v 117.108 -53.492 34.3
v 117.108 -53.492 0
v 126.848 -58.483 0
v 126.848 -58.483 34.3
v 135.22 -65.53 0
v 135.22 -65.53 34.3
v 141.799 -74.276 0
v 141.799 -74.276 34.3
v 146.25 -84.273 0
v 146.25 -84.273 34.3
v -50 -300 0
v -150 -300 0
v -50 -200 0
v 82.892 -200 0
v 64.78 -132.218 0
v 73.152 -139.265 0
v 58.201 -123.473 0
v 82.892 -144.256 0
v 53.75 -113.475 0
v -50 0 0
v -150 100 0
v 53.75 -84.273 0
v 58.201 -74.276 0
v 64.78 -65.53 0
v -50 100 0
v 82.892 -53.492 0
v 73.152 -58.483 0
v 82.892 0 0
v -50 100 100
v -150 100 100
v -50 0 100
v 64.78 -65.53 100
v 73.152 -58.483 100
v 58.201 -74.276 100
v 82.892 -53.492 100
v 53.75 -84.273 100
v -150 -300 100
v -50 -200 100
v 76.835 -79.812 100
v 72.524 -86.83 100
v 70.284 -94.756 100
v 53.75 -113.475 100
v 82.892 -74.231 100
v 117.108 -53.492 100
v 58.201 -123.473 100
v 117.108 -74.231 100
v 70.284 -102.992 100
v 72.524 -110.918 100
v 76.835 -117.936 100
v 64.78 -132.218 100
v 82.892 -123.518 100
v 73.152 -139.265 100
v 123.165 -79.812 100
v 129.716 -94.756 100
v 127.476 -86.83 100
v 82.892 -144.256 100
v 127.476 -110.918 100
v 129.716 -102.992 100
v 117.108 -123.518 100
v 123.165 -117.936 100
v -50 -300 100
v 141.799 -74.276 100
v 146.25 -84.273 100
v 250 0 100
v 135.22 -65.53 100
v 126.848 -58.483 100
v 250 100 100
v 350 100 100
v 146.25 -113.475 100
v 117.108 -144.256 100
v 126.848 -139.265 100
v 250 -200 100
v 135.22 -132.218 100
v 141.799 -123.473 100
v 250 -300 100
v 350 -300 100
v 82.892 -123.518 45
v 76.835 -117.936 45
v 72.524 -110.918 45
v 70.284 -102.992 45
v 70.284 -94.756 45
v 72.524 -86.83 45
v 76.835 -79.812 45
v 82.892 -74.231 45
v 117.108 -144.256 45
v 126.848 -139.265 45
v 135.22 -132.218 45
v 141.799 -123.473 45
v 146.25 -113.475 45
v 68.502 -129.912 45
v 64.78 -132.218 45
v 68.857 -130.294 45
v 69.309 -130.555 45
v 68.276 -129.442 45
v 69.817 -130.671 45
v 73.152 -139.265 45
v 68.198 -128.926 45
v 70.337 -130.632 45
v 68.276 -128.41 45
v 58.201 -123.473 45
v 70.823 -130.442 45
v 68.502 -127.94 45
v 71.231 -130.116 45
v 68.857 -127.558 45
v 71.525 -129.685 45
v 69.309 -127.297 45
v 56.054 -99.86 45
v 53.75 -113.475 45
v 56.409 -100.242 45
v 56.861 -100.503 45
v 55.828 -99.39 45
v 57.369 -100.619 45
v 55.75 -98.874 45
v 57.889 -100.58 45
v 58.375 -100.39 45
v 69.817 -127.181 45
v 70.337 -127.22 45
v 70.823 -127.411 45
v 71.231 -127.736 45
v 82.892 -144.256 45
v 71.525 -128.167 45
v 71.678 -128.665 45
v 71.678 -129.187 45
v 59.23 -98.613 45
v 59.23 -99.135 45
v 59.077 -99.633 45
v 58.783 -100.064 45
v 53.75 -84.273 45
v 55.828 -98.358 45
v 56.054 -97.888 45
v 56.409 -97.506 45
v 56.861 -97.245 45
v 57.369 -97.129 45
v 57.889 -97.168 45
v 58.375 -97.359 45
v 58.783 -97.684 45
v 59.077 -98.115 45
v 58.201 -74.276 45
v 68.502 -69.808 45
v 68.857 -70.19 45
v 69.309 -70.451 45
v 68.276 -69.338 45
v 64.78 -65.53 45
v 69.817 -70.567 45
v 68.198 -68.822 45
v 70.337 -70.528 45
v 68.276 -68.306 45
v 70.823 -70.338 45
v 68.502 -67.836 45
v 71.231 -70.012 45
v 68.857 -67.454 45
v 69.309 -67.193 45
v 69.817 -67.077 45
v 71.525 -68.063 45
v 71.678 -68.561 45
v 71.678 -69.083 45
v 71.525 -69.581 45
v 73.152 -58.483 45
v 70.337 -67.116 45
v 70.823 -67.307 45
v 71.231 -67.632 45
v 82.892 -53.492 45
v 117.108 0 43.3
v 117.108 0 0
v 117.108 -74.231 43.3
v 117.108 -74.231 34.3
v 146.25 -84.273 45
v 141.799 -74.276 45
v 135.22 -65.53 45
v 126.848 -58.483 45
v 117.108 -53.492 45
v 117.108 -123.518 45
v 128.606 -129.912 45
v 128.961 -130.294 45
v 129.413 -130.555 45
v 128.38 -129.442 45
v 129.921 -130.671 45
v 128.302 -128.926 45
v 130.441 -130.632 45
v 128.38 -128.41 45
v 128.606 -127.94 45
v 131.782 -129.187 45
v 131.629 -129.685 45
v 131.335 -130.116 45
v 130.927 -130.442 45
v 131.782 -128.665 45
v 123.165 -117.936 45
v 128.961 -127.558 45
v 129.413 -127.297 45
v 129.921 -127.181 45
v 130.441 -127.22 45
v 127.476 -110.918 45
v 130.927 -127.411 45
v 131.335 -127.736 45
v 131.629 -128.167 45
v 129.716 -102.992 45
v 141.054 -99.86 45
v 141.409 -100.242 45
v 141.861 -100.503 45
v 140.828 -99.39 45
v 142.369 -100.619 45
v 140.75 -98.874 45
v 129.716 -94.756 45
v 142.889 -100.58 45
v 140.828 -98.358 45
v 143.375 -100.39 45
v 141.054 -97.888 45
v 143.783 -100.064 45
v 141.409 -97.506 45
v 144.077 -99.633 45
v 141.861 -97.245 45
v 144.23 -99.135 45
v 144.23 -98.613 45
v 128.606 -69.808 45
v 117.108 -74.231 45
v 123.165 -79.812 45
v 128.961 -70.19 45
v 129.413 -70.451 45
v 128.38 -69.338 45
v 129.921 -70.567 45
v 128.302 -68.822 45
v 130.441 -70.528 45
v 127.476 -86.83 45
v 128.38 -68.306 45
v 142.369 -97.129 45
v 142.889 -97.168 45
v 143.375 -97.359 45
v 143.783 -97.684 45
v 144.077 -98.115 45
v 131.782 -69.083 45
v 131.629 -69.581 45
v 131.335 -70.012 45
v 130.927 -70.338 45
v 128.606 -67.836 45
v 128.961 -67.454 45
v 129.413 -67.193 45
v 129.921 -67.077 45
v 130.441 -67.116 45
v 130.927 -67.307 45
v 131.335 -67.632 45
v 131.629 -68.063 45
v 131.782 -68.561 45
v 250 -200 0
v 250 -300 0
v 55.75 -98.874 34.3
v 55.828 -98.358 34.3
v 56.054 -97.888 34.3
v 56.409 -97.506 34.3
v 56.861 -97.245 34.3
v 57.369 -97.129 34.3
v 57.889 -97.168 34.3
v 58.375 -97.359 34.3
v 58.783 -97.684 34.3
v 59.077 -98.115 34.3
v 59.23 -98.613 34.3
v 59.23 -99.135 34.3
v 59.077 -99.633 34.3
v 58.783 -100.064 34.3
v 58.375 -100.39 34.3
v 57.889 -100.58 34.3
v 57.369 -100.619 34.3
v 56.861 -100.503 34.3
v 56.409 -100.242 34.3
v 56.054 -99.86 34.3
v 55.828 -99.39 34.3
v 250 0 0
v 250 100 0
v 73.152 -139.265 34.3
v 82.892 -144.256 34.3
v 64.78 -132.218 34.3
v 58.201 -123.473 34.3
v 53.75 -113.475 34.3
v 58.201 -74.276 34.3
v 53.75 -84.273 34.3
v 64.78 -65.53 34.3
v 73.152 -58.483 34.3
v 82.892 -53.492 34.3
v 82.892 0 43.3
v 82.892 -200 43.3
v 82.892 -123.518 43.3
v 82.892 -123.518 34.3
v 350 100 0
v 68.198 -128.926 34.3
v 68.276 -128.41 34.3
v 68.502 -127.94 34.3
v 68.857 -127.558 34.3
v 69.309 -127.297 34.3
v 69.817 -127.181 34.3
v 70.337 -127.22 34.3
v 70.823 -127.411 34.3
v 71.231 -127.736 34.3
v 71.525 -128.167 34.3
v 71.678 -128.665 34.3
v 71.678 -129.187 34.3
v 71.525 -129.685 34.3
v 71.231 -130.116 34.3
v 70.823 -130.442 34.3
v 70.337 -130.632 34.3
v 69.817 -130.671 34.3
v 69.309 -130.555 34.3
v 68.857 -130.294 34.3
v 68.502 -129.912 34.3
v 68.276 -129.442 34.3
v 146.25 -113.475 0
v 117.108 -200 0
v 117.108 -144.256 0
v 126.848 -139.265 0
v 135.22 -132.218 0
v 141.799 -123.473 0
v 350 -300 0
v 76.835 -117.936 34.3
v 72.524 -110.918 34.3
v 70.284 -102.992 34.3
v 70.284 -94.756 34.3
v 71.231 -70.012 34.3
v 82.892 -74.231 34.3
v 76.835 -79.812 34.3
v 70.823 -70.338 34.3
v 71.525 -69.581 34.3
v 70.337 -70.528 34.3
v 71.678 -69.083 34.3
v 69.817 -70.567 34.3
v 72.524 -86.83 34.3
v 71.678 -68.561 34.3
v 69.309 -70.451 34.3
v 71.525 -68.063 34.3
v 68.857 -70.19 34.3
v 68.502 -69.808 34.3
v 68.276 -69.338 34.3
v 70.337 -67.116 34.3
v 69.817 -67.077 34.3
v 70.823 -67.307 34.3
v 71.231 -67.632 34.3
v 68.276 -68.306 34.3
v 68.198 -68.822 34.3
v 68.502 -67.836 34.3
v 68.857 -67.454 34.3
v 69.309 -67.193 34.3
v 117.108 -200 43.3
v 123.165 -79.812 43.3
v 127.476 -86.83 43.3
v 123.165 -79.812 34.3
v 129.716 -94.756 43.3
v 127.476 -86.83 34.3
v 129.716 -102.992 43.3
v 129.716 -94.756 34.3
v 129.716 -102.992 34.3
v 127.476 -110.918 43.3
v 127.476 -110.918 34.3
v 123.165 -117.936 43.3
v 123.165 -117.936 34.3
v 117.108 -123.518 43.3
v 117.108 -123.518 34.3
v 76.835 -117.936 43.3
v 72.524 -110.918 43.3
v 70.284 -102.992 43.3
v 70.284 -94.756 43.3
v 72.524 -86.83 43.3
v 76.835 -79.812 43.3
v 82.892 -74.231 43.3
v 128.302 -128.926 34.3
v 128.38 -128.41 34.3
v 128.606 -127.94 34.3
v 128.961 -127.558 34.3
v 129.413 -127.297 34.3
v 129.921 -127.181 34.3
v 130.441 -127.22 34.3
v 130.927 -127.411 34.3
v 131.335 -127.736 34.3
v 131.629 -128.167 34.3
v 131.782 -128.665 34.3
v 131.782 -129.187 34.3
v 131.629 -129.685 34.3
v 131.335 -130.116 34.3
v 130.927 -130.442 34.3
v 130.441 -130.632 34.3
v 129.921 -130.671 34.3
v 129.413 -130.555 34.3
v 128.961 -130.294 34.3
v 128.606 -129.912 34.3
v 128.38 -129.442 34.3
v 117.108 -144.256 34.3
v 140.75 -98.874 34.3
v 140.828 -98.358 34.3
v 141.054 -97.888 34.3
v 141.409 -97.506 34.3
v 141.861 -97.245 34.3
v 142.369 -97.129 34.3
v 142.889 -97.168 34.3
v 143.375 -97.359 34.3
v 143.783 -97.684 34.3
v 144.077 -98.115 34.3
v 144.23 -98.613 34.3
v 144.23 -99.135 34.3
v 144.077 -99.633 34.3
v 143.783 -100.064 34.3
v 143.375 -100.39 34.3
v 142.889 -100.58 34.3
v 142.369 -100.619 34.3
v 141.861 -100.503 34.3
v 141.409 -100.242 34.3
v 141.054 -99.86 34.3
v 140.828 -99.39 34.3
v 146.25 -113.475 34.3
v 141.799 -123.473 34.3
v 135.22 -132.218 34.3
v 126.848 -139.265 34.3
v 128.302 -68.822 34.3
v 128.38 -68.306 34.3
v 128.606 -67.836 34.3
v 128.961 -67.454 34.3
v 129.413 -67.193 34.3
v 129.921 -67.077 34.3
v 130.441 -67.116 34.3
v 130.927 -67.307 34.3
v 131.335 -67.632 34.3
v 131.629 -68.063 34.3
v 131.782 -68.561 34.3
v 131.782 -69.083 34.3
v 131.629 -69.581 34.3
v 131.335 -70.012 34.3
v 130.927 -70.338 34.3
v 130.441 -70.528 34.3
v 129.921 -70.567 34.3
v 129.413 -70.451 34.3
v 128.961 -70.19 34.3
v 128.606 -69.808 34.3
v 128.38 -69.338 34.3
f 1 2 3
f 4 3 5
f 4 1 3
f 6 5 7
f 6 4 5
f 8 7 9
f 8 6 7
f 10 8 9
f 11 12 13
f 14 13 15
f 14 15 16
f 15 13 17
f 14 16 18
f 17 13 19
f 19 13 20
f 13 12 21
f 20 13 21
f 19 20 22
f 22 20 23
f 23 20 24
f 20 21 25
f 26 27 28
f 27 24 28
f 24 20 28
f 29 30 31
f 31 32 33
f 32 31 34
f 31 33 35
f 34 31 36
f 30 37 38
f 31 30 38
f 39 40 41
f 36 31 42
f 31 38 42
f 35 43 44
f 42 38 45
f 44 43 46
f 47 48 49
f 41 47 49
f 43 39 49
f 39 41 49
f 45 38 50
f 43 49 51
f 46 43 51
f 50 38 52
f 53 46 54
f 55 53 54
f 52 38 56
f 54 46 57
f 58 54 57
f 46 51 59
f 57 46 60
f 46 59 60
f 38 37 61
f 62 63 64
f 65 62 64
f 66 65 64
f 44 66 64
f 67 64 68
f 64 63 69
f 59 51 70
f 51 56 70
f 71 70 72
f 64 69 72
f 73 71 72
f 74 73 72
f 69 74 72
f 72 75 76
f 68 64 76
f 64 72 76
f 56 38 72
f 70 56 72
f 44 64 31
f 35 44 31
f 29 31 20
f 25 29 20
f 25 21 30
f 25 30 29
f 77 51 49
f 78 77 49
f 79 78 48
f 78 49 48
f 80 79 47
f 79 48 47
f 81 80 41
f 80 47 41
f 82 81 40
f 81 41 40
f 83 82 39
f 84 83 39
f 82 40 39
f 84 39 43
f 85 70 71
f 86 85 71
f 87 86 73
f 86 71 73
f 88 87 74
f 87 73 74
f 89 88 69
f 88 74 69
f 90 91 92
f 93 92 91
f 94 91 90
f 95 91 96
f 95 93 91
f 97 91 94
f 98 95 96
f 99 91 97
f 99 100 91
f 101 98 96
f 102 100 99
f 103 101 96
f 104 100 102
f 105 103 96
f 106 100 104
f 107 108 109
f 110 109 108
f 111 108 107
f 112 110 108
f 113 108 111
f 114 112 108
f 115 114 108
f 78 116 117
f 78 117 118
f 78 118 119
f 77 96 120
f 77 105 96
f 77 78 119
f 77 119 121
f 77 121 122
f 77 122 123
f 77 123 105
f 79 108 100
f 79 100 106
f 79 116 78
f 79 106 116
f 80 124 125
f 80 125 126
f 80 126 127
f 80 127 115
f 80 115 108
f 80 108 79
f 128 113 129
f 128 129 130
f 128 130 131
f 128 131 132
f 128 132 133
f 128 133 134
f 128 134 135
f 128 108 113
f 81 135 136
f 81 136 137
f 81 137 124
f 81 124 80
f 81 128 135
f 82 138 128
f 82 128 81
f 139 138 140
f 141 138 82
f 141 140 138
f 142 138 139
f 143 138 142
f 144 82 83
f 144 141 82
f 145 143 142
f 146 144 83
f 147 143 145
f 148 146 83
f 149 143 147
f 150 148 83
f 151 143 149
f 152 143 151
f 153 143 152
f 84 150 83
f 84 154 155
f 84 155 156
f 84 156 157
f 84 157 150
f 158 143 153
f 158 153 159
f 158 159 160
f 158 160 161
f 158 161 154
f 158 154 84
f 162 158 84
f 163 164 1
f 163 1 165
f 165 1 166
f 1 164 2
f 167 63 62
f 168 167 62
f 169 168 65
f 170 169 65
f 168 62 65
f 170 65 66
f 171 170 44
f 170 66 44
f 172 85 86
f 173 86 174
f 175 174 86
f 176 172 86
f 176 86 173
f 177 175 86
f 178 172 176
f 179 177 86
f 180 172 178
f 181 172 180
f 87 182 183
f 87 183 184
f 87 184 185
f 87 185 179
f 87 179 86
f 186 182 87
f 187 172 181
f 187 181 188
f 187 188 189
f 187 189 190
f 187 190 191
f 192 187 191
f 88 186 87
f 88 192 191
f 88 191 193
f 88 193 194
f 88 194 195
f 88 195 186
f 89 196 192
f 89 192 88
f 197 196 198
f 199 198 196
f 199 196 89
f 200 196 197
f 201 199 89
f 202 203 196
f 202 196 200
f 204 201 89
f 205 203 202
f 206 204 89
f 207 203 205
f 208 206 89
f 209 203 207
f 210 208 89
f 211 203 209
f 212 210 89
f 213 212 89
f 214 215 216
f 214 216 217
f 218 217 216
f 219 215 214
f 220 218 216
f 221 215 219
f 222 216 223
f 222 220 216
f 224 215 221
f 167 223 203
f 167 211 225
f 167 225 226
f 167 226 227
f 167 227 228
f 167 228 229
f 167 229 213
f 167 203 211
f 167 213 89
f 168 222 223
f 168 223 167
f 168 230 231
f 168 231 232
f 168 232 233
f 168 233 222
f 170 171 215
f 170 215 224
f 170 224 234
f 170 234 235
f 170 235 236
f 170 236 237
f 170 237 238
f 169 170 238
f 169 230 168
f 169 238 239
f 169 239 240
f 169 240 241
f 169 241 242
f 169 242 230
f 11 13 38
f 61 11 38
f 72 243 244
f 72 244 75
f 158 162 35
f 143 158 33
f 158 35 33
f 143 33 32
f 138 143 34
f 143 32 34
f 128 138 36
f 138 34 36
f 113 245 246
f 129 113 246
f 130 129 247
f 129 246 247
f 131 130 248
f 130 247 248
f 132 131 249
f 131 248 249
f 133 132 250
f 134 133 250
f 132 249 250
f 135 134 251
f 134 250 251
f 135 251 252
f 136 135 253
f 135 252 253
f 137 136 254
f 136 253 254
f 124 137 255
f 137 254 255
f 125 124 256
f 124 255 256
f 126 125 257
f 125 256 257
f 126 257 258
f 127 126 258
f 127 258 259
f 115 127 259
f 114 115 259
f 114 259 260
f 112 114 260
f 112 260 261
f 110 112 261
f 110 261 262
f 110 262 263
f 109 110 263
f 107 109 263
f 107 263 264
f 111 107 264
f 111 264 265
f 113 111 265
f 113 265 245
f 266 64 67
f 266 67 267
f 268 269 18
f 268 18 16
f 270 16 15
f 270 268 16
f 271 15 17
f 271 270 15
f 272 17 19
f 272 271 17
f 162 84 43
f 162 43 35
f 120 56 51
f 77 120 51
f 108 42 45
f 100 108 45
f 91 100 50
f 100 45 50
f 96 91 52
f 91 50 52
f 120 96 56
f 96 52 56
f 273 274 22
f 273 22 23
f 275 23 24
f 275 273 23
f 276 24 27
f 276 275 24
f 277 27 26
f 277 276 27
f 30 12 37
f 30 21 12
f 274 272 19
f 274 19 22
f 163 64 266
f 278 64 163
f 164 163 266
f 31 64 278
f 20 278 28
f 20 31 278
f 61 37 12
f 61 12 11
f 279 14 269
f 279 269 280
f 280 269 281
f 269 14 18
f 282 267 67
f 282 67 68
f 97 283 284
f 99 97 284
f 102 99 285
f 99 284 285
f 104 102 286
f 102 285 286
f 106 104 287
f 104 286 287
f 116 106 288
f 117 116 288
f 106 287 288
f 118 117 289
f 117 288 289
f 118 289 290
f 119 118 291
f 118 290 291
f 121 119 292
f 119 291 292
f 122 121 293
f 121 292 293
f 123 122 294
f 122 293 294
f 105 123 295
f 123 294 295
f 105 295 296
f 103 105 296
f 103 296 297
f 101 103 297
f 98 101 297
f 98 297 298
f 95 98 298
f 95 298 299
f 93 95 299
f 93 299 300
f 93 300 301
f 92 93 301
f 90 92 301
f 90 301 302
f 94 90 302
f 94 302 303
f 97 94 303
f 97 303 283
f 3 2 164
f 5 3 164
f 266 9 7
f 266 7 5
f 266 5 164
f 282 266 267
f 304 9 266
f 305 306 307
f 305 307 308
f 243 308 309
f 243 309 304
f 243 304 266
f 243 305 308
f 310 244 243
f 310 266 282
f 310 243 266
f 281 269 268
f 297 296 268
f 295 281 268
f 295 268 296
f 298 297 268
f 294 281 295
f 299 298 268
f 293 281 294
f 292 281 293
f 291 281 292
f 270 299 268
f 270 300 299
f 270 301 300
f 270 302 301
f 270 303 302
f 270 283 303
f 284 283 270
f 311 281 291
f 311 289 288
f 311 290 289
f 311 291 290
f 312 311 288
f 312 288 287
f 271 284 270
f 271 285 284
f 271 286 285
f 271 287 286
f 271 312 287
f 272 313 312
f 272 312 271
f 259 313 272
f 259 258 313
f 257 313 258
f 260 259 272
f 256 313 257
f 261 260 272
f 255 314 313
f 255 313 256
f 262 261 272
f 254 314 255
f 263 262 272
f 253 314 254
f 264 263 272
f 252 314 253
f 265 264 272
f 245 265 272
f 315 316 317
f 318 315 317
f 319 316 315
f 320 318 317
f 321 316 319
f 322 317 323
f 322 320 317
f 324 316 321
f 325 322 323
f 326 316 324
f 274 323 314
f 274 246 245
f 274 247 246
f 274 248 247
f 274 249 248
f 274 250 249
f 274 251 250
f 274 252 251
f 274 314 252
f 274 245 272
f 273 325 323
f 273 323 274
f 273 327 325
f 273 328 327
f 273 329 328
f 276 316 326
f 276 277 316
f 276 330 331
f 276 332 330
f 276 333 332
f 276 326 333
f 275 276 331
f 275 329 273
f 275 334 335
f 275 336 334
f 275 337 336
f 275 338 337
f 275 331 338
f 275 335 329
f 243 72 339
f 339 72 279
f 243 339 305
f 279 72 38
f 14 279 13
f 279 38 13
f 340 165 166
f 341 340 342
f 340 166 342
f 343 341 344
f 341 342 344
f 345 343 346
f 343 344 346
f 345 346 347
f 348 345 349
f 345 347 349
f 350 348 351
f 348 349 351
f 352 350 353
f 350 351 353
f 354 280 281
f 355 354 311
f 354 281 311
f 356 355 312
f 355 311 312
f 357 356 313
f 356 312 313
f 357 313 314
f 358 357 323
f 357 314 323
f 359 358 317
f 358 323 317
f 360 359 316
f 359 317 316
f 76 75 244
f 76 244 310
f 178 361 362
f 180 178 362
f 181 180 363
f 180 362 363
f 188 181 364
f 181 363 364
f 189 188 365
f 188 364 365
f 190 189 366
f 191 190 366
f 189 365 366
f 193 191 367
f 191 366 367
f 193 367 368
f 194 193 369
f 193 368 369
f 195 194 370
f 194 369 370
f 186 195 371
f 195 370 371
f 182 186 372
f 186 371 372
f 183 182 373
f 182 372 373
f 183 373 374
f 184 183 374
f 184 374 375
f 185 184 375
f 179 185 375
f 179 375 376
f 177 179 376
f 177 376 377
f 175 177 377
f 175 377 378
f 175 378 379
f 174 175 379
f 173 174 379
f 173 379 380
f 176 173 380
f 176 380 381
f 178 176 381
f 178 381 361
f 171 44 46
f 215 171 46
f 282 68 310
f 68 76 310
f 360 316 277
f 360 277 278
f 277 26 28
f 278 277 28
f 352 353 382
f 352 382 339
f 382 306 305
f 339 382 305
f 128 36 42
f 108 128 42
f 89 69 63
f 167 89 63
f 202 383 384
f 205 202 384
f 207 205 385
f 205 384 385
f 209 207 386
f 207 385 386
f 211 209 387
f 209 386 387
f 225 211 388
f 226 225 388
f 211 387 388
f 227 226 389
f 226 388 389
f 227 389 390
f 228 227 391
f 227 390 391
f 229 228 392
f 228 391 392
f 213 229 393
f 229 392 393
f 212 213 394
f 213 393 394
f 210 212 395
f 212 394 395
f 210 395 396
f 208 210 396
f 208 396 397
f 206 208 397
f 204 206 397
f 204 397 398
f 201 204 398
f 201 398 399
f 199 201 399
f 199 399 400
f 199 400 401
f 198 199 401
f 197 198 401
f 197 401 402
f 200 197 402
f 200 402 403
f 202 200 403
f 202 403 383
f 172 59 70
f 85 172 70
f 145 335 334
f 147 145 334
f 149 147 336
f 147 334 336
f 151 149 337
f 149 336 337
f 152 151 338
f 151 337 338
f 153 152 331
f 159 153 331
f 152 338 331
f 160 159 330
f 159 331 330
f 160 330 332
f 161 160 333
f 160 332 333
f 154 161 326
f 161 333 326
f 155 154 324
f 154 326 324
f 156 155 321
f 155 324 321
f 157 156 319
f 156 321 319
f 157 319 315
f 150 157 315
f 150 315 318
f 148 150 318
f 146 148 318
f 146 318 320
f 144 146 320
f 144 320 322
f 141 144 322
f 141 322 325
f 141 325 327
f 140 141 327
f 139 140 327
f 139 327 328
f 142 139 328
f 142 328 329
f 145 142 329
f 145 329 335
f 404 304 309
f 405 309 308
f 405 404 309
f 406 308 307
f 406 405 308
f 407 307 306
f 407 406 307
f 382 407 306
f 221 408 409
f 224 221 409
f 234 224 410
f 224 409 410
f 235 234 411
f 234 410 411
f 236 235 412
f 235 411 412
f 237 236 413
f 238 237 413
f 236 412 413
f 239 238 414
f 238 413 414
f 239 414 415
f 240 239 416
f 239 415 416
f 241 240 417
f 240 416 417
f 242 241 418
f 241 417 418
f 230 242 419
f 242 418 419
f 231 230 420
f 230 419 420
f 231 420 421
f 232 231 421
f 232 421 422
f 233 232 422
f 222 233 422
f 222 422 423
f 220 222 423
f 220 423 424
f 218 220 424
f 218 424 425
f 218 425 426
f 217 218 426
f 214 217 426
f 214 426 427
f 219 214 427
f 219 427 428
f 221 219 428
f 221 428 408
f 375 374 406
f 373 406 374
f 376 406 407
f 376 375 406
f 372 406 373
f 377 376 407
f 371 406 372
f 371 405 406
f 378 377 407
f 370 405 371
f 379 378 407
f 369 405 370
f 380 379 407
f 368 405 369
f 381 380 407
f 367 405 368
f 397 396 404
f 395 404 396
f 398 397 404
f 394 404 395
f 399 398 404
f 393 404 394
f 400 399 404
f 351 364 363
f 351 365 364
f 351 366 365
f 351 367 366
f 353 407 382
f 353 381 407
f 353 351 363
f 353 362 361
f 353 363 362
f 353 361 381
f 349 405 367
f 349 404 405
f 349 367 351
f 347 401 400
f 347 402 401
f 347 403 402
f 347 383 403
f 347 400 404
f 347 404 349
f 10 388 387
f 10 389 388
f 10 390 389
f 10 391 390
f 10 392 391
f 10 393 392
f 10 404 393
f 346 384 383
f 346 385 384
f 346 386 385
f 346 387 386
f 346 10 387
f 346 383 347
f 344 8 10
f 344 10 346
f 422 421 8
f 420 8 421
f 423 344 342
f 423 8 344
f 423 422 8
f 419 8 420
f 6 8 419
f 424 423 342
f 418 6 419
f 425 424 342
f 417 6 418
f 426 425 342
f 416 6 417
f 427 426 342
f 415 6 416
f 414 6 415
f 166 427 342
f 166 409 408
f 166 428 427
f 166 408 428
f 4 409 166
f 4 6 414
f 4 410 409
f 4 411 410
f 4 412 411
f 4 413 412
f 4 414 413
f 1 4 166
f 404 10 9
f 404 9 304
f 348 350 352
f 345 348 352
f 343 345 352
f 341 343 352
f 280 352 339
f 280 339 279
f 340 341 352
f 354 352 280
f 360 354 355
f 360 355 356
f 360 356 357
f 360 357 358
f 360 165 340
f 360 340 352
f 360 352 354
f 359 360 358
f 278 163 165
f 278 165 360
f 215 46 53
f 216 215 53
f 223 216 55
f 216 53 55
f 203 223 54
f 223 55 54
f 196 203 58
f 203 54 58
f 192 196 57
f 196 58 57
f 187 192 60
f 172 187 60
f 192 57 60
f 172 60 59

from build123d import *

# Parameters (mm, degrees)
SKETCH_1_W               = 200
SKETCH_1_H               = 200
EXTRUDE_1_DEPTH          = 100
CUT_EXTRUDE_1_DEPTH      = 301
CUT_EXTRUDE_1_DEPTH_BACK = 34.3
SKETCH_3_R               = 30
CUT_EXTRUDE_2_DEPTH      = 9
CUT_EXTRUDE_3_REACH      = 302
CUT_EXTRUDE_4_DEPTH      = 55
SKETCH_7_R               = 1.75
CUT_EXTRUDE_7_DEPTH      = 291.373018719
SKETCH_9_W               = 100
SKETCH_9_H               = 200
EXTRUDE_2_DEPTH          = 150
SKETCH_10_W              = 100
SKETCH_10_H              = 200
EXTRUDE_3_DEPTH          = 150
SKETCH_11_W              = 100
SKETCH_11_H              = 100
EXTRUDE_4_DEPTH          = 100
SKETCH_12_W              = 100
SKETCH_12_H              = 100
EXTRUDE_5_DEPTH          = 100


with BuildPart() as part:
    # 草图1 → 凸台-拉伸1 (new body)
    with BuildSketch(Plane.XY):
        with Locations((100, -100)):
            Rectangle(SKETCH_1_W, SKETCH_1_H)
    extrude(amount=EXTRUDE_1_DEPTH)

    # 草图2 → 切除-拉伸1 (cut, two sides: drawn at the far end of the back side and taken through both)
    with BuildSketch(Plane(origin=(0, 0, 0), x_dir=(-1, 0, 0), z_dir=(0, 0, -1)).offset(-CUT_EXTRUDE_1_DEPTH_BACK)):
        with BuildLine():
            Line((-146.25, -84.273215621), (-146.25, -98.874157372))
            Line((-146.25, -98.874157372), (-146.25, -113.475099122))
            ThreePointArc((-146.25, -113.475099122), (-100, -147.374157372), (-53.75, -113.475099122))
            Line((-53.75, -113.475099122), (-53.75, -84.273215621))
            ThreePointArc((-53.75, -84.273215621), (-100, -50.374157372), (-146.25, -84.273215621))
        make_face()
    extrude(amount=CUT_EXTRUDE_1_DEPTH + CUT_EXTRUDE_1_DEPTH_BACK, mode=Mode.SUBTRACT)

    # 草图3 → 切除-拉伸2 (cut)
    with BuildSketch(Plane(origin=(0, 0, 34.3), x_dir=(-1, 0, 0), z_dir=(0, 0, -1))):
        with Locations((-100, -98.874157372)):
            Circle(SKETCH_3_R)
    extrude(amount=-CUT_EXTRUDE_2_DEPTH, mode=Mode.SUBTRACT)

    # 切除-拉伸3: up to this face of the body (flat: up to its plane)
    cut_extrude_3_end = Plane(part.part.faces().sort_by_distance((100, -98.874157372, 43.3))[0])
    # 草图4 → 切除-拉伸3 (cut, up to the picked face)
    with BuildSketch(Plane(origin=(0, 0, 0), x_dir=(-1, 0, 0), z_dir=(0, 0, -1)), mode=Mode.PRIVATE) as cut_extrude_3_sk1:
        with BuildLine():
            Line((-82.891665128, 0), (-117.108334872, 0))
            Line((-117.108334872, 0), (-117.108334872, -53.491838371))
            ThreePointArc((-117.108334872, -53.491838371), (-100, -50.374157372), (-82.891665128, -53.491838371))
            Line((-82.891665128, -53.491838371), (-82.891665128, 0))
        make_face()
    cut_extrude_3_tool1 = split(extrude(cut_extrude_3_sk1.sketch, amount=-CUT_EXTRUDE_3_REACH, mode=Mode.PRIVATE), bisect_by=cut_extrude_3_end, keep=Keep.BOTH, mode=Mode.PRIVATE)
    # 草图4 → 切除-拉伸3 (cut, up to the picked face)
    with BuildSketch(Plane(origin=(0, 0, 0), x_dir=(-1, 0, 0), z_dir=(0, 0, -1)), mode=Mode.PRIVATE) as cut_extrude_3_sk2:
        with BuildLine():
            ThreePointArc((-82.891665128, -53.491838371), (-100, -50.374157372), (-117.108334872, -53.491838371))
            Line((-117.108334872, -53.491838371), (-117.108334872, -74.230600853))
            ThreePointArc((-117.108334872, -74.230600853), (-100, -68.874157372), (-82.891665128, -74.230600853))
            Line((-82.891665128, -74.230600853), (-82.891665128, -53.491838371))
        make_face()
    cut_extrude_3_tool2 = split(extrude(cut_extrude_3_sk2.sketch, amount=-CUT_EXTRUDE_3_REACH, mode=Mode.PRIVATE), bisect_by=cut_extrude_3_end, keep=Keep.BOTH, mode=Mode.PRIVATE)
    # 草图4 → 切除-拉伸3 (cut, up to the picked face)
    with BuildSketch(Plane(origin=(0, 0, 0), x_dir=(-1, 0, 0), z_dir=(0, 0, -1)), mode=Mode.PRIVATE) as cut_extrude_3_sk3:
        with BuildLine():
            ThreePointArc((-82.891665128, -74.230600853), (-100, -68.874157372), (-117.108334872, -74.230600853))
            Line((-117.108334872, -74.230600853), (-117.108334872, -123.517713891))
            ThreePointArc((-117.108334872, -123.517713891), (-100, -128.874157372), (-82.891665128, -123.517713891))
            Line((-82.891665128, -123.517713891), (-82.891665128, -74.230600853))
        make_face()
    cut_extrude_3_tool3 = split(extrude(cut_extrude_3_sk3.sketch, amount=-CUT_EXTRUDE_3_REACH, mode=Mode.PRIVATE), bisect_by=cut_extrude_3_end, keep=Keep.BOTH, mode=Mode.PRIVATE)
    # 草图4 → 切除-拉伸3 (cut, up to the picked face)
    with BuildSketch(Plane(origin=(0, 0, 0), x_dir=(-1, 0, 0), z_dir=(0, 0, -1)), mode=Mode.PRIVATE) as cut_extrude_3_sk4:
        with BuildLine():
            ThreePointArc((-82.891665128, -123.517713891), (-100, -128.874157372), (-117.108334872, -123.517713891))
            Line((-117.108334872, -123.517713891), (-117.108334872, -144.256476373))
            ThreePointArc((-117.108334872, -144.256476373), (-100, -147.374157372), (-82.891665128, -144.256476373))
            Line((-82.891665128, -144.256476373), (-82.891665128, -123.517713891))
        make_face()
    cut_extrude_3_tool4 = split(extrude(cut_extrude_3_sk4.sketch, amount=-CUT_EXTRUDE_3_REACH, mode=Mode.PRIVATE), bisect_by=cut_extrude_3_end, keep=Keep.BOTH, mode=Mode.PRIVATE)
    # 草图4 → 切除-拉伸3 (cut, up to the picked face)
    with BuildSketch(Plane(origin=(0, 0, 0), x_dir=(-1, 0, 0), z_dir=(0, 0, -1)), mode=Mode.PRIVATE) as cut_extrude_3_sk5:
        with BuildLine():
            ThreePointArc((-82.891665128, -144.256476373), (-100, -147.374157372), (-117.108334872, -144.256476373))
            Line((-117.108334872, -144.256476373), (-117.108334872, -200))
            Line((-117.108334872, -200), (-82.891665128, -200))
            Line((-82.891665128, -200), (-82.891665128, -144.256476373))
        make_face()
    cut_extrude_3_tool5 = split(extrude(cut_extrude_3_sk5.sketch, amount=-CUT_EXTRUDE_3_REACH, mode=Mode.PRIVATE), bisect_by=cut_extrude_3_end, keep=Keep.BOTH, mode=Mode.PRIVATE)
    add(cut_extrude_3_tool1.solids().sort_by(Axis((100, -25.708145, 0), (0, 0, 1)))[0], mode=Mode.SUBTRACT)
    add(cut_extrude_3_tool2.solids().sort_by(Axis((100, -61.037282, 0), (0, 0, 1)))[0], mode=Mode.SUBTRACT)
    add(cut_extrude_3_tool3.solids().sort_by(Axis((100, -98.874157, 0), (0, 0, 1)))[0], mode=Mode.SUBTRACT)
    add(cut_extrude_3_tool4.solids().sort_by(Axis((100, -136.711033, 0), (0, 0, 1)))[0], mode=Mode.SUBTRACT)
    add(cut_extrude_3_tool5.solids().sort_by(Axis((100, -173.166361, 0), (0, 0, 1)))[0], mode=Mode.SUBTRACT)

    # 草图6 → 切除-拉伸4 (cut)
    with BuildSketch(Plane.XY.offset(100)):
        with BuildLine():
            Line((82.891665128, -74.230600853), (82.891665128, -53.491838371))
            ThreePointArc((82.891665128, -53.491838371), (64.780077431, -65.530386526), (53.75, -84.273215621))
            Line((53.75, -84.273215621), (53.75, -113.475099122))
            ThreePointArc((53.75, -113.475099122), (64.780077431, -132.217928217), (82.891665128, -144.256476373))
            Line((82.891665128, -144.256476373), (82.891665128, -123.517713891))
            ThreePointArc((82.891665128, -123.517713891), (70, -98.874157372), (82.891665128, -74.230600853))
        make_face()
        with BuildLine():
            Line((117.108334872, -53.491838371), (117.108334872, -74.230600853))
            ThreePointArc((117.108334872, -74.230600853), (130, -98.874157372), (117.108334872, -123.517713891))
            Line((117.108334872, -123.517713891), (117.108334872, -144.256476373))
            ThreePointArc((117.108334872, -144.256476373), (135.219922569, -132.217928217), (146.25, -113.475099122))
            Line((146.25, -113.475099122), (146.25, -84.273215621))
            ThreePointArc((146.25, -84.273215621), (135.219922569, -65.530386526), (117.108334872, -53.491838371))
        make_face()
    extrude(amount=-CUT_EXTRUDE_4_DEPTH, mode=Mode.SUBTRACT)

    # 草图7 → 切除-拉伸7 (cut, through all)
    with BuildSketch(Plane(origin=(0, 0, 34.3), x_dir=(-1, 0, 0), z_dir=(0, 0, -1))):
        with Locations((-142.5, -98.874157372)):
            Circle(SKETCH_7_R)
        with Locations((-130.0520382, -68.822119171)):
            Circle(SKETCH_7_R)
        with Locations((-69.9479618, -68.822119171)):
            Circle(SKETCH_7_R)
        with Locations((-57.5, -98.874157372)):
            Circle(SKETCH_7_R)
        with Locations((-69.9479618, -128.926195572)):
            Circle(SKETCH_7_R)
        with Locations((-130.0520382, -128.926195572)):
            Circle(SKETCH_7_R)
    extrude(amount=-CUT_EXTRUDE_7_DEPTH, mode=Mode.SUBTRACT)

    # 草图9 → 凸台-拉伸2 (add)
    with BuildSketch(Plane.ZY):
        with Locations((50, -100)):
            Rectangle(SKETCH_9_W, SKETCH_9_H)
    extrude(amount=EXTRUDE_2_DEPTH)

    # 草图10 → 凸台-拉伸3 (add)
    with BuildSketch(Plane(origin=(200, 0, 0), x_dir=(0, 0, -1), z_dir=(1, 0, 0))):
        with Locations((-50, -100)):
            Rectangle(SKETCH_10_W, SKETCH_10_H)
    extrude(amount=EXTRUDE_3_DEPTH)

    # 草图11 → 凸台-拉伸4 (add)
    with BuildSketch(Plane.XZ.offset(200)):
        with Locations((-100, 50)):
            Rectangle(SKETCH_11_W, SKETCH_11_H)
        with Locations((300, 50)):
            Rectangle(SKETCH_11_W, SKETCH_11_H)
    extrude(amount=EXTRUDE_4_DEPTH)

    # 草图12 → 凸台-拉伸5 (add)
    with BuildSketch(Plane(origin=(0, 0, 0), x_dir=(1, 0, 0), z_dir=(0, 1, 0))):
        with Locations((300, -50)):
            Rectangle(SKETCH_12_W, SKETCH_12_H)
        with Locations((-100, -50)):
            Rectangle(SKETCH_12_W, SKETCH_12_H)
    extrude(amount=EXTRUDE_5_DEPTH)


solid = part.part
